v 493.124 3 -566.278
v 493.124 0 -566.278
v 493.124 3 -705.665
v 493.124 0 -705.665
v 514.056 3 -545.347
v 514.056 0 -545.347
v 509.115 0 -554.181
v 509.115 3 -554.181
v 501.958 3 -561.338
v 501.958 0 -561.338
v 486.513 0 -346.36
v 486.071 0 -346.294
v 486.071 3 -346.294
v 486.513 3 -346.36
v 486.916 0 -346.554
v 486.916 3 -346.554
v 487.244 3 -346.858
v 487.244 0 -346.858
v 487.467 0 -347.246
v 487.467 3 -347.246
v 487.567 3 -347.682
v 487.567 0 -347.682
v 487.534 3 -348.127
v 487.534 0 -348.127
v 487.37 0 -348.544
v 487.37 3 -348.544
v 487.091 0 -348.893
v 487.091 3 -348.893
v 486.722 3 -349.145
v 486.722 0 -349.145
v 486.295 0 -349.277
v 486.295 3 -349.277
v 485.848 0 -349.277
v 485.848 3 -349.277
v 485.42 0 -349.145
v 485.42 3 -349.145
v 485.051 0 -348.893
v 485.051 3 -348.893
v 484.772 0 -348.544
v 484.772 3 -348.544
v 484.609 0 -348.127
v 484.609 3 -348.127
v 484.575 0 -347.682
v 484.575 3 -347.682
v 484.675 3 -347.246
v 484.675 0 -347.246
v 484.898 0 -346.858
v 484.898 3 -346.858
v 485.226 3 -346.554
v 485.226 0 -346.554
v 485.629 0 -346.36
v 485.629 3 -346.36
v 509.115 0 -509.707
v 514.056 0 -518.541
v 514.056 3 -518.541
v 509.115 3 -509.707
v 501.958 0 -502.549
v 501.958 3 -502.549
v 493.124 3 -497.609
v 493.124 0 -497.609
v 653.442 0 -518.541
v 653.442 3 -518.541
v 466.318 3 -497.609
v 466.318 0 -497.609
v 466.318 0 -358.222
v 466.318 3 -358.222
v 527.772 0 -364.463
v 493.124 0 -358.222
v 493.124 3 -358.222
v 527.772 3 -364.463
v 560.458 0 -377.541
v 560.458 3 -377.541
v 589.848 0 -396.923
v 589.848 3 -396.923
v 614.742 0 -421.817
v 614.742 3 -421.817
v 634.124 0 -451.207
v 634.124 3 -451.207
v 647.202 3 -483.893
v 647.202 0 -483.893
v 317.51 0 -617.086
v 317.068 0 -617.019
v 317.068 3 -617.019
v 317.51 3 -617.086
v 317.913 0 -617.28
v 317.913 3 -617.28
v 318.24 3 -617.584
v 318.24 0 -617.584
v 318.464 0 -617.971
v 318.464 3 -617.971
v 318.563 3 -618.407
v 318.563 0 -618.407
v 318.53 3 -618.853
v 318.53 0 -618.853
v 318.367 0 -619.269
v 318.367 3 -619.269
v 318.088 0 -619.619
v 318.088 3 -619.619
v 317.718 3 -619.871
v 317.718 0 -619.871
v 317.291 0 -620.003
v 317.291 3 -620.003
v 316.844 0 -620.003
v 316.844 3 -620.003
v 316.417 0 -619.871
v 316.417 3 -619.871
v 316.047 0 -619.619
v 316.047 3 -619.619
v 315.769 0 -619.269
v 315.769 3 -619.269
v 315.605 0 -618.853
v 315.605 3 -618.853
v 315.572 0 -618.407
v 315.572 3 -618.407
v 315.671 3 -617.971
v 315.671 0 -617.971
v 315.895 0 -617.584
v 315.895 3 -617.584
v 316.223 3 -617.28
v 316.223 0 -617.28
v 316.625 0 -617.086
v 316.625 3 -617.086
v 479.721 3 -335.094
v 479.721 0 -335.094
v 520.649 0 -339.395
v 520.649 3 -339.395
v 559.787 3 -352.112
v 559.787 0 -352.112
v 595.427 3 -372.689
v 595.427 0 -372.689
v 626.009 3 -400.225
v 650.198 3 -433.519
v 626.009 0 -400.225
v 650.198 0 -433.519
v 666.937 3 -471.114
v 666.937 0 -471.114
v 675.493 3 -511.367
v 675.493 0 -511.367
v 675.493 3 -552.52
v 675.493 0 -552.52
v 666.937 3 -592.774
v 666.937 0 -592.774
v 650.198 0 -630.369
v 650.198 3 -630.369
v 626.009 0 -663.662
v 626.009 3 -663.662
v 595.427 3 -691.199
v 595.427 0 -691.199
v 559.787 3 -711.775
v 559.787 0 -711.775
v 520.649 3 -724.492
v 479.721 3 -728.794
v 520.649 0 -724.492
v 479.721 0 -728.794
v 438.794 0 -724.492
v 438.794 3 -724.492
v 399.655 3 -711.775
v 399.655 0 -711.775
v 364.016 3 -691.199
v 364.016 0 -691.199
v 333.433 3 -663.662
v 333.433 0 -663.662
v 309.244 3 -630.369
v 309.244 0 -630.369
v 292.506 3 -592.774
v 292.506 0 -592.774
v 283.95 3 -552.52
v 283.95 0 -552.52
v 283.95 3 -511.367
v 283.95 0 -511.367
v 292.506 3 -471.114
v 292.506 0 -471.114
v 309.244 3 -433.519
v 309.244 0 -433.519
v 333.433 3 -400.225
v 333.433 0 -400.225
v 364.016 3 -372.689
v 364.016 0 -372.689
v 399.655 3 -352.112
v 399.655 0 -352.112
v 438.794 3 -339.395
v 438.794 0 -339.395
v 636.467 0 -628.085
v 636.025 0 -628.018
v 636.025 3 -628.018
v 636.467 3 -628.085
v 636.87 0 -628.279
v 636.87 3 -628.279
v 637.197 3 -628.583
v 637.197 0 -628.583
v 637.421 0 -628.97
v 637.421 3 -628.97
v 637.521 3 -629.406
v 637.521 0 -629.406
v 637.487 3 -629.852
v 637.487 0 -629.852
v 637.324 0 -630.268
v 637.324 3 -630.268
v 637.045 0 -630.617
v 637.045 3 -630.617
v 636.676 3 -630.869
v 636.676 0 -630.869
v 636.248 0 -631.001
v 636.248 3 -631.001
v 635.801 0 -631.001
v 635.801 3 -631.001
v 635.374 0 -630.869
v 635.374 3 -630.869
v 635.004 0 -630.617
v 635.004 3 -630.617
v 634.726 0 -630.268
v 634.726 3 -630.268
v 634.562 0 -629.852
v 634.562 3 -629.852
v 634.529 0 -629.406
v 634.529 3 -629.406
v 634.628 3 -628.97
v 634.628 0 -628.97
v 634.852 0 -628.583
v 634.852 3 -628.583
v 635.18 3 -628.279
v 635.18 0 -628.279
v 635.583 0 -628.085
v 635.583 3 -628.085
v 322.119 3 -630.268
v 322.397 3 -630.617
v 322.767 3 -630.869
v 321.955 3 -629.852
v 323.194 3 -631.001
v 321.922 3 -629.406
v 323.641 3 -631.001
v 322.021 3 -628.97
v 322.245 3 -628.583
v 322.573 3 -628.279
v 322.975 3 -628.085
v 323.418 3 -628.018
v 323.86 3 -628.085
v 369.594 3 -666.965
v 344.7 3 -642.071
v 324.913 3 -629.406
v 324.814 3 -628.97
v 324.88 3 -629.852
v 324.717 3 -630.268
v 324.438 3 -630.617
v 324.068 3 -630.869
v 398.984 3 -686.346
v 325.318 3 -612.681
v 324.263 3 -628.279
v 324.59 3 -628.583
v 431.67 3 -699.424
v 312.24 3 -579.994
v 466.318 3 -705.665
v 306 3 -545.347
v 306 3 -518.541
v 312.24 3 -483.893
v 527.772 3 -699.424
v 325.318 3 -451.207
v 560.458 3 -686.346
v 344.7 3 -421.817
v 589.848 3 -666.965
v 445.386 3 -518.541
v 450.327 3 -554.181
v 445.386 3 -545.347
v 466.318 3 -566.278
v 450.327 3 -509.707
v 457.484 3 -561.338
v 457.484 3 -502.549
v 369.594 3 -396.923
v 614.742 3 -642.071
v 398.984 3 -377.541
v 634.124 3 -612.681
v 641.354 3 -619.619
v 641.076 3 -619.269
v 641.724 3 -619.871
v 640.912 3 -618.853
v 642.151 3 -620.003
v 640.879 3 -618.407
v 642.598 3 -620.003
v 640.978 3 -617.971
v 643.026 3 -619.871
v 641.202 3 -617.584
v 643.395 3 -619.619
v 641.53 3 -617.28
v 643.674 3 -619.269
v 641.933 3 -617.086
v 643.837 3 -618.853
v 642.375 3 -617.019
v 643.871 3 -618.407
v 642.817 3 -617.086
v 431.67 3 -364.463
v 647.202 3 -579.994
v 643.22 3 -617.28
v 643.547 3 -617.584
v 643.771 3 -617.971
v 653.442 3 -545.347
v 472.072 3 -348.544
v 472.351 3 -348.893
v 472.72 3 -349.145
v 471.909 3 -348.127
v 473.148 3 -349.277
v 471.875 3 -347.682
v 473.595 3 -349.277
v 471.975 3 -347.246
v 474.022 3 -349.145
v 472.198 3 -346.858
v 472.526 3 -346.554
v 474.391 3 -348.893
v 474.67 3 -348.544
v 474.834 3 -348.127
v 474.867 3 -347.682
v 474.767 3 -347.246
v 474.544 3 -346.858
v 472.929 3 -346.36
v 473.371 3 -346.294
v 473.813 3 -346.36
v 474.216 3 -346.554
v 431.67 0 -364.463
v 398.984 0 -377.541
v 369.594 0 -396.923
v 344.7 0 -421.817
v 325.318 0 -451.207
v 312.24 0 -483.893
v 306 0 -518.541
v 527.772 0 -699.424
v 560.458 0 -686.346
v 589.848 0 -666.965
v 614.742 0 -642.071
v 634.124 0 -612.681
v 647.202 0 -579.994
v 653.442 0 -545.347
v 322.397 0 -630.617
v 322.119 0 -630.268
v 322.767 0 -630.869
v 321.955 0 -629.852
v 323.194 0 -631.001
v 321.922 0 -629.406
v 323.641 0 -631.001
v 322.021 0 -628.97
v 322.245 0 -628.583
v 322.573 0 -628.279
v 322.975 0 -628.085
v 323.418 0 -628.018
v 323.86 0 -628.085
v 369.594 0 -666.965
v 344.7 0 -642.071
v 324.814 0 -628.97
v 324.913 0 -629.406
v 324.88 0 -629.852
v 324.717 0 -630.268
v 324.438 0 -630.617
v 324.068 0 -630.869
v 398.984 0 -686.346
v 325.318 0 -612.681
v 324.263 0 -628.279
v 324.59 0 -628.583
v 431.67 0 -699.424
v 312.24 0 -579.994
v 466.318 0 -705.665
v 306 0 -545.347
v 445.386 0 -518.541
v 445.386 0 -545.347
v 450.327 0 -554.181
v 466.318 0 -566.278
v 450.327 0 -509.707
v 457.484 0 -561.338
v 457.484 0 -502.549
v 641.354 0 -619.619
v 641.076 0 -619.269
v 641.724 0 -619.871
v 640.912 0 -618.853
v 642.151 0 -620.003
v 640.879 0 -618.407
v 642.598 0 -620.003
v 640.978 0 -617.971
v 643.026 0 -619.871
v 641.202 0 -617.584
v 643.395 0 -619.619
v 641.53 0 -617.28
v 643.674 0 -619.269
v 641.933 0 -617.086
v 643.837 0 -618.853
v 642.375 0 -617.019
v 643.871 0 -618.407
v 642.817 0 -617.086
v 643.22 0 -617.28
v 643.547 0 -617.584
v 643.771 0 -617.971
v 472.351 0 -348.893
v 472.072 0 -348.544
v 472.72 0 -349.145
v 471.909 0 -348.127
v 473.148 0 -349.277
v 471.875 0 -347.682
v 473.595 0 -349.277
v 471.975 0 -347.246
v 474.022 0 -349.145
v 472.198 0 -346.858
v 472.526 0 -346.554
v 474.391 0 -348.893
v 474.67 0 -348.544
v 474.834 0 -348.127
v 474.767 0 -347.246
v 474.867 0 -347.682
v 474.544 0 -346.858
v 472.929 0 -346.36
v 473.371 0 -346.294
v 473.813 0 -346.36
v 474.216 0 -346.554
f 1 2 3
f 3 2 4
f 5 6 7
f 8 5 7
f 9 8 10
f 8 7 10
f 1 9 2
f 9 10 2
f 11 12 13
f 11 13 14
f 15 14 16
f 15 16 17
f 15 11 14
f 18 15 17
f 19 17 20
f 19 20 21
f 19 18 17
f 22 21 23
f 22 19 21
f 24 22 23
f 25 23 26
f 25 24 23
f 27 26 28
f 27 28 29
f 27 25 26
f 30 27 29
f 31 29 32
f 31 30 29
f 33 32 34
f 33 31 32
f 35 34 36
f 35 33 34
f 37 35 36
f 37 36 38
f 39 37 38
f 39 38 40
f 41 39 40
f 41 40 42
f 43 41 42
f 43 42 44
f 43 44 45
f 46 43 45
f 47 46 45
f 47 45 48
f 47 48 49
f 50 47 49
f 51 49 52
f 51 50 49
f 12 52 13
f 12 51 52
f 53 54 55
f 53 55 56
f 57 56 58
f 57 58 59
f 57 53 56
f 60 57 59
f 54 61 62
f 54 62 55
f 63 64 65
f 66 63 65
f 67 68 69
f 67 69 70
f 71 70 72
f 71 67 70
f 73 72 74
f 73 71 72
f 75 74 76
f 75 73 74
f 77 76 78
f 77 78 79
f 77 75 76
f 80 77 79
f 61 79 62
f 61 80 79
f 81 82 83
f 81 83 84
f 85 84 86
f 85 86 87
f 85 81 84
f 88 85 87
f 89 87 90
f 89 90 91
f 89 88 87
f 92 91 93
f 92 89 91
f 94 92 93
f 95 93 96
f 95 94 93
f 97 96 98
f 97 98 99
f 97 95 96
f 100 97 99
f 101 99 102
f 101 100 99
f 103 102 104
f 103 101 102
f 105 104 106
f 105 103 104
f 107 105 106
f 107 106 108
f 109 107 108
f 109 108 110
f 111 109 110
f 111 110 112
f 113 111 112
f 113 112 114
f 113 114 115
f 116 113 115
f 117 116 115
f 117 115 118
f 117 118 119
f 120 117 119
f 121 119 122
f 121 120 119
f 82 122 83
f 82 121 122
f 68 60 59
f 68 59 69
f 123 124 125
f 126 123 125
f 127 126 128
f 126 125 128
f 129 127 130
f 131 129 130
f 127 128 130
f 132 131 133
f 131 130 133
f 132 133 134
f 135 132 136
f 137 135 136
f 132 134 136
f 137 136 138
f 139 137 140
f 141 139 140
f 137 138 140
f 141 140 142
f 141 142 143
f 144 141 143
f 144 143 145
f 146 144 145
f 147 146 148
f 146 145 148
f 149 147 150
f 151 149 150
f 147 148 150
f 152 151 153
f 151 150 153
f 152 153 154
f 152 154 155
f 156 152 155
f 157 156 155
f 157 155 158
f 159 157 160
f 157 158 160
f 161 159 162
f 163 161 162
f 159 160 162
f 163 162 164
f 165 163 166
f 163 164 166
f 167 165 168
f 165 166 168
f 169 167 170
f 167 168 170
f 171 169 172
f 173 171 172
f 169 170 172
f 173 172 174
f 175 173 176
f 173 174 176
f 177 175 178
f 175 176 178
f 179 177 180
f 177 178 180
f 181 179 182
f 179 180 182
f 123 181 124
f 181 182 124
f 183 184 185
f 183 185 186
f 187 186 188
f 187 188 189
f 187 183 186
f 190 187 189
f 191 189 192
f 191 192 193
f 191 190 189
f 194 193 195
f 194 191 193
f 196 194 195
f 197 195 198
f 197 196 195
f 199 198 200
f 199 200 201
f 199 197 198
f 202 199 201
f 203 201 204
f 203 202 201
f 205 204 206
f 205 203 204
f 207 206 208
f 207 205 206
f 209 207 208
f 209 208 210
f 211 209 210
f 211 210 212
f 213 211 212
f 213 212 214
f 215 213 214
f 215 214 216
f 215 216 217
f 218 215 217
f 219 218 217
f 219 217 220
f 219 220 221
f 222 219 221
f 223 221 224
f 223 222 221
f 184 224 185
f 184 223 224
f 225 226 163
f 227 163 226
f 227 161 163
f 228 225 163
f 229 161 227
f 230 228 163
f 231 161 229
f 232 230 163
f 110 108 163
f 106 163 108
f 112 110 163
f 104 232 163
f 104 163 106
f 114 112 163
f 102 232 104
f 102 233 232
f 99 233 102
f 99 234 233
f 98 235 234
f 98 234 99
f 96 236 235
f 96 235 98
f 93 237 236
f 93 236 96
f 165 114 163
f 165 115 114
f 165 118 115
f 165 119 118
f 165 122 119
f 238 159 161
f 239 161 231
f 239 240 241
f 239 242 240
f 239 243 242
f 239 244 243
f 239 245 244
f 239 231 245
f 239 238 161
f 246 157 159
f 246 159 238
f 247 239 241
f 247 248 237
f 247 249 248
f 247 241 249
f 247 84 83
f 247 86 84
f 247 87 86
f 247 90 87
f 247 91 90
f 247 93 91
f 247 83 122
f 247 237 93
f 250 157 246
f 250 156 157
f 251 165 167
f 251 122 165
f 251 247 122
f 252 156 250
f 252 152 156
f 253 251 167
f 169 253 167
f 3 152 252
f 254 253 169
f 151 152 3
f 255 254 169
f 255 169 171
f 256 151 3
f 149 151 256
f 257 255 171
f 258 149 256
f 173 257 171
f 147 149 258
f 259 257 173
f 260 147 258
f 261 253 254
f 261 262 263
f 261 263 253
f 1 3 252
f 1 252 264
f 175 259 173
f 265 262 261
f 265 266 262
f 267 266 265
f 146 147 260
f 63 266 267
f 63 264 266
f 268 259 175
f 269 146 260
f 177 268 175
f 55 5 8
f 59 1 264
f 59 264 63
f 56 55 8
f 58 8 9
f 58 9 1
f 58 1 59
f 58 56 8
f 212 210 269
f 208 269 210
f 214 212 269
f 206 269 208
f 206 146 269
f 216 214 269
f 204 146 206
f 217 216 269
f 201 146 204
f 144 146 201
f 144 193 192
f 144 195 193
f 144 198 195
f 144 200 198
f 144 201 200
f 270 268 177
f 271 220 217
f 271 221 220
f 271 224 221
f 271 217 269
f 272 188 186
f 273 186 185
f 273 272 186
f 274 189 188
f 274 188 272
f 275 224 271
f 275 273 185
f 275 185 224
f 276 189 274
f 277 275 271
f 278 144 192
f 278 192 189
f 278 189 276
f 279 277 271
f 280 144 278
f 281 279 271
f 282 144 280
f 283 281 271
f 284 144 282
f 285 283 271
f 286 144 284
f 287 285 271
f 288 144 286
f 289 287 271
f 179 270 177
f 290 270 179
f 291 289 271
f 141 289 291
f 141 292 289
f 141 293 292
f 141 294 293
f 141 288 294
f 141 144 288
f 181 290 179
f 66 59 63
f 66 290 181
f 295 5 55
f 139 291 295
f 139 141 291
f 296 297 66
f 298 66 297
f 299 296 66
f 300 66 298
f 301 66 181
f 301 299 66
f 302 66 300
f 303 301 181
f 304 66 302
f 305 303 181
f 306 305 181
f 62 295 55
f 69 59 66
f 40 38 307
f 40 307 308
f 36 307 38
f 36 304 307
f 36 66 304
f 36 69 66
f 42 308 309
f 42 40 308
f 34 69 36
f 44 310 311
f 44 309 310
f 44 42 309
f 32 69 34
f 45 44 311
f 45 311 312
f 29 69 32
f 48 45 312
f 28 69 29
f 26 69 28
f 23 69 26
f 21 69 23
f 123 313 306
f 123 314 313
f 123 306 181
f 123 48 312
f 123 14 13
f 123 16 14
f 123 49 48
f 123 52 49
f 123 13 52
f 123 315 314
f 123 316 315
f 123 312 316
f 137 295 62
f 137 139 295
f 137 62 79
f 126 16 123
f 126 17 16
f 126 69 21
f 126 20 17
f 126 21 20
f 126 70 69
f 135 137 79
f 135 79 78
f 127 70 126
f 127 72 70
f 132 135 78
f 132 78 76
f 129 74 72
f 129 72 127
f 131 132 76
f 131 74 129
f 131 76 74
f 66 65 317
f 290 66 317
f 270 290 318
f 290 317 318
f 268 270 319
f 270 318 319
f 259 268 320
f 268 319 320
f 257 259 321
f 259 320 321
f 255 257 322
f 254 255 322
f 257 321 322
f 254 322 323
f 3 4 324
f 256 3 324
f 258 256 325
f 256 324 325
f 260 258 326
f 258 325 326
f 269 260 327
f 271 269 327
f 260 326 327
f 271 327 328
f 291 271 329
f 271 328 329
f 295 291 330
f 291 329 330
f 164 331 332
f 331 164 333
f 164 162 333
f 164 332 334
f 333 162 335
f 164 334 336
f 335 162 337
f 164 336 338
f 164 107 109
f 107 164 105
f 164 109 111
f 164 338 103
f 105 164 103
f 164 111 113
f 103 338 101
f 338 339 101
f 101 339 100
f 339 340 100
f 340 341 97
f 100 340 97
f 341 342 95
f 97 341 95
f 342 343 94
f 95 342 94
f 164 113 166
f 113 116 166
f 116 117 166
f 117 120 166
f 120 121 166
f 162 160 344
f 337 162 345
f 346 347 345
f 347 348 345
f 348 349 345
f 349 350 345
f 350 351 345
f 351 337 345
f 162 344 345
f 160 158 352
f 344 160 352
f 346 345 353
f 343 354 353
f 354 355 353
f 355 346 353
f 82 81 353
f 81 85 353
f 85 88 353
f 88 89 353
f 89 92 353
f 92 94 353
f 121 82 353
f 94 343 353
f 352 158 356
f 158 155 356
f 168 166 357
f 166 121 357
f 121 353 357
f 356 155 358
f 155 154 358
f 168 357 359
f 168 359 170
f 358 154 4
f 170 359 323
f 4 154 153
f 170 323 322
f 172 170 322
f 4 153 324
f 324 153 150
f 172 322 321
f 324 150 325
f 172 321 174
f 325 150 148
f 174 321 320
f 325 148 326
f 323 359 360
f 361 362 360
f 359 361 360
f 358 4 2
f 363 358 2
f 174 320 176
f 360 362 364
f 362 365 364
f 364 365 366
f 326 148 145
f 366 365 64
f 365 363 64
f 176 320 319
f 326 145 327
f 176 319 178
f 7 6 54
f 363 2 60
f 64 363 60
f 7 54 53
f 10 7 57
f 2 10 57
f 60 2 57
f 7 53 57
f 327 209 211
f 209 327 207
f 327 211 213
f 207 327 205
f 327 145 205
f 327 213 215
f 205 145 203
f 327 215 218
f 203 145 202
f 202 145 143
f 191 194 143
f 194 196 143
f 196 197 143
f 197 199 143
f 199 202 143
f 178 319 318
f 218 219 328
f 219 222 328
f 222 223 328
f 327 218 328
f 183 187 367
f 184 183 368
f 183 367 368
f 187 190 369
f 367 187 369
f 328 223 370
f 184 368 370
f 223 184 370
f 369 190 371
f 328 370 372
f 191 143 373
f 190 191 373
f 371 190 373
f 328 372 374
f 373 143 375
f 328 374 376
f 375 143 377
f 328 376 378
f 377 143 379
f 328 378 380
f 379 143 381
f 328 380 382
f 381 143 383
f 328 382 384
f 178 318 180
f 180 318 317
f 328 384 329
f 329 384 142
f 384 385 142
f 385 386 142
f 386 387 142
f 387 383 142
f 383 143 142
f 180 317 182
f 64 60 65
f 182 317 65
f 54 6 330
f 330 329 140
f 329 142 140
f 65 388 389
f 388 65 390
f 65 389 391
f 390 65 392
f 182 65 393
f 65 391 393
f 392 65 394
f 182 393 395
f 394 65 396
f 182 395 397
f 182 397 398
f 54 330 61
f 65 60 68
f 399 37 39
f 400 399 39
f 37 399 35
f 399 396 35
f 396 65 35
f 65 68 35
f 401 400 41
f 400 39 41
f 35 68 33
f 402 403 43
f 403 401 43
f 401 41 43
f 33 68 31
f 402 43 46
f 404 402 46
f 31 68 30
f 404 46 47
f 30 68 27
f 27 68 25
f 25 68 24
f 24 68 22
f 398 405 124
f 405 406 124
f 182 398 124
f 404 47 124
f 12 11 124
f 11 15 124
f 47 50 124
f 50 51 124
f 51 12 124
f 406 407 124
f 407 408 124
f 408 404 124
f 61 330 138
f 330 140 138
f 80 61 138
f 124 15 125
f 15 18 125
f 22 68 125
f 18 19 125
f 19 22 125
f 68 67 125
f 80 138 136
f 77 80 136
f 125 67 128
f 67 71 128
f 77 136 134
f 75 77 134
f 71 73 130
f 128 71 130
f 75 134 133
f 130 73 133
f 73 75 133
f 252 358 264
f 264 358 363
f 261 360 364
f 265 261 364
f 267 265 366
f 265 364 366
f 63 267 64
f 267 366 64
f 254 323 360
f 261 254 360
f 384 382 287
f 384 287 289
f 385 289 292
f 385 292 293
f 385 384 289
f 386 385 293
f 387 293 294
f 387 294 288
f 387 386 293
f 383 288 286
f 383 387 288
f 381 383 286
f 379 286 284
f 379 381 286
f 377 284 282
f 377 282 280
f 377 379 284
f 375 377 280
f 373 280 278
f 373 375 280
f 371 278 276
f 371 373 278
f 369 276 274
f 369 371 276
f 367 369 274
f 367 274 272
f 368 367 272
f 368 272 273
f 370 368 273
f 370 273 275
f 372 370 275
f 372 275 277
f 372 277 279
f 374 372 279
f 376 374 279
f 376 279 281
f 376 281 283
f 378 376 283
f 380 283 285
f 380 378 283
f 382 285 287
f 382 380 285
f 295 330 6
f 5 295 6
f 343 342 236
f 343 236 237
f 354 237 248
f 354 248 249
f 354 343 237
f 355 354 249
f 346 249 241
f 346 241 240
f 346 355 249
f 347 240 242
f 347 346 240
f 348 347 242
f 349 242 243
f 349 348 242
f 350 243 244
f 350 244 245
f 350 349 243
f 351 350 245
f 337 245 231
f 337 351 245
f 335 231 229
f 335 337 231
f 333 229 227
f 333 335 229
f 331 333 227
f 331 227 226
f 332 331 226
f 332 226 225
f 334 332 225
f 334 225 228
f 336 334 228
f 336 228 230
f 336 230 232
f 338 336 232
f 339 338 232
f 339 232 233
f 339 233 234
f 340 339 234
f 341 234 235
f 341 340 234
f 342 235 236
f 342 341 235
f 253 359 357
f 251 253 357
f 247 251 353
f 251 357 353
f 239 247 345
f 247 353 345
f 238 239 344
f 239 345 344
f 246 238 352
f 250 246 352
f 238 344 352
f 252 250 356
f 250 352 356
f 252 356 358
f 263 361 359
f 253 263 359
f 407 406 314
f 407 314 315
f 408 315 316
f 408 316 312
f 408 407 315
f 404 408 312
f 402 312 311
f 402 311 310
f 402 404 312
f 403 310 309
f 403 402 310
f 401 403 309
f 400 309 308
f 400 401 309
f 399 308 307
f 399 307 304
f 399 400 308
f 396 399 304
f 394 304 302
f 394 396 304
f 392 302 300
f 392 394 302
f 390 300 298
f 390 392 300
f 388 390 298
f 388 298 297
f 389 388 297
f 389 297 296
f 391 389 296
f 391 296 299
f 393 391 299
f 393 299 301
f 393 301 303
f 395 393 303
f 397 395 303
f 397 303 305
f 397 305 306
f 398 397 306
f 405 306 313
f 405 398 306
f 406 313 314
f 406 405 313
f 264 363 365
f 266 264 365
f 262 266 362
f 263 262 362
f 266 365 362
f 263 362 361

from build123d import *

# Parameters (mm, degrees)
SKETCH1_R           = 196.85
SKETCH1_R_2         = 1.5
BOSS_EXTRUDE1_DEPTH = 3


with BuildPart() as part:
    # Sketch1 → Boss-Extrude1 (new body)
    with BuildSketch(Plane(origin=(0, 0, 0), x_dir=(1, 0, 0), z_dir=(0, 1, 0))):
        with Locations(Location((479.721156758, 531.943650225, 0), (0, 0, 270))):
            Circle(SKETCH1_R)
        with Locations(Location((473.371156758, 347.793650225, 0), (0, 0, 270))):
            Circle(SKETCH1_R_2, mode=Mode.SUBTRACT)
        with Locations(Location((486.071156758, 347.793650225, 0), (0, 0, 270))):
            Circle(SKETCH1_R_2, mode=Mode.SUBTRACT)
        with Locations(Location((323.417578651, 629.517911539, 0), (0, 0, 270))):
            Circle(SKETCH1_R_2, mode=Mode.SUBTRACT)
        with Locations(Location((317.067578651, 618.519388911, 0), (0, 0, 270))):
            Circle(SKETCH1_R_2, mode=Mode.SUBTRACT)
        with Locations(Location((642.374734865, 618.519388911, 0), (0, 0, 270))):
            Circle(SKETCH1_R_2, mode=Mode.SUBTRACT)
        with Locations(Location((636.024734865, 629.517911539, 0), (0, 0, 270))):
            Circle(SKETCH1_R_2, mode=Mode.SUBTRACT)
        with BuildLine():
            Line((653.442357833, 518.540768582), (514.055823837, 518.540768582))
            ThreePointArc((514.055823837, 518.540768582), (505.783645125, 505.881161858), (493.124038401, 497.608983146))
            Line((493.124038401, 497.608983146), (493.124038401, 358.22244915))
            ThreePointArc((493.124038401, 358.22244915), (602.925647219, 408.739159764), (653.442357833, 518.540768582))
        make_face(mode=Mode.SUBTRACT)
        with BuildLine():
            Line((305.999955683, 518.540768582), (445.386489679, 518.540768582))
            ThreePointArc((445.386489679, 518.540768582), (453.658668391, 505.881161858), (466.318275115, 497.608983146))
            Line((466.318275115, 497.608983146), (466.318275115, 358.22244915))
            ThreePointArc((466.318275115, 358.22244915), (356.516666298, 408.739159764), (305.999955683, 518.540768582))
        make_face(mode=Mode.SUBTRACT)
        with BuildLine():
            Line((653.442357833, 545.346531867), (514.055823837, 545.346531867))
            ThreePointArc((514.055823837, 545.346531867), (505.783645125, 558.006138591), (493.124038401, 566.278317303))
            Line((493.124038401, 566.278317303), (493.124038401, 705.6648513))
            ThreePointArc((493.124038401, 705.6648513), (602.925647219, 655.148140685), (653.442357833, 545.346531867))
        make_face(mode=Mode.SUBTRACT)
        with BuildLine():
            Line((445.386489679, 545.346531867), (305.999955683, 545.346531867))
            ThreePointArc((305.999955683, 545.346531867), (356.516666298, 655.148140685), (466.318275115, 705.6648513))
            Line((466.318275115, 705.6648513), (466.318275115, 566.278317303))
            ThreePointArc((466.318275115, 566.278317303), (453.658668391, 558.006138591), (445.386489679, 545.346531867))
        make_face(mode=Mode.SUBTRACT)
    extrude(amount=BOSS_EXTRUDE1_DEPTH)


solid = part.part
